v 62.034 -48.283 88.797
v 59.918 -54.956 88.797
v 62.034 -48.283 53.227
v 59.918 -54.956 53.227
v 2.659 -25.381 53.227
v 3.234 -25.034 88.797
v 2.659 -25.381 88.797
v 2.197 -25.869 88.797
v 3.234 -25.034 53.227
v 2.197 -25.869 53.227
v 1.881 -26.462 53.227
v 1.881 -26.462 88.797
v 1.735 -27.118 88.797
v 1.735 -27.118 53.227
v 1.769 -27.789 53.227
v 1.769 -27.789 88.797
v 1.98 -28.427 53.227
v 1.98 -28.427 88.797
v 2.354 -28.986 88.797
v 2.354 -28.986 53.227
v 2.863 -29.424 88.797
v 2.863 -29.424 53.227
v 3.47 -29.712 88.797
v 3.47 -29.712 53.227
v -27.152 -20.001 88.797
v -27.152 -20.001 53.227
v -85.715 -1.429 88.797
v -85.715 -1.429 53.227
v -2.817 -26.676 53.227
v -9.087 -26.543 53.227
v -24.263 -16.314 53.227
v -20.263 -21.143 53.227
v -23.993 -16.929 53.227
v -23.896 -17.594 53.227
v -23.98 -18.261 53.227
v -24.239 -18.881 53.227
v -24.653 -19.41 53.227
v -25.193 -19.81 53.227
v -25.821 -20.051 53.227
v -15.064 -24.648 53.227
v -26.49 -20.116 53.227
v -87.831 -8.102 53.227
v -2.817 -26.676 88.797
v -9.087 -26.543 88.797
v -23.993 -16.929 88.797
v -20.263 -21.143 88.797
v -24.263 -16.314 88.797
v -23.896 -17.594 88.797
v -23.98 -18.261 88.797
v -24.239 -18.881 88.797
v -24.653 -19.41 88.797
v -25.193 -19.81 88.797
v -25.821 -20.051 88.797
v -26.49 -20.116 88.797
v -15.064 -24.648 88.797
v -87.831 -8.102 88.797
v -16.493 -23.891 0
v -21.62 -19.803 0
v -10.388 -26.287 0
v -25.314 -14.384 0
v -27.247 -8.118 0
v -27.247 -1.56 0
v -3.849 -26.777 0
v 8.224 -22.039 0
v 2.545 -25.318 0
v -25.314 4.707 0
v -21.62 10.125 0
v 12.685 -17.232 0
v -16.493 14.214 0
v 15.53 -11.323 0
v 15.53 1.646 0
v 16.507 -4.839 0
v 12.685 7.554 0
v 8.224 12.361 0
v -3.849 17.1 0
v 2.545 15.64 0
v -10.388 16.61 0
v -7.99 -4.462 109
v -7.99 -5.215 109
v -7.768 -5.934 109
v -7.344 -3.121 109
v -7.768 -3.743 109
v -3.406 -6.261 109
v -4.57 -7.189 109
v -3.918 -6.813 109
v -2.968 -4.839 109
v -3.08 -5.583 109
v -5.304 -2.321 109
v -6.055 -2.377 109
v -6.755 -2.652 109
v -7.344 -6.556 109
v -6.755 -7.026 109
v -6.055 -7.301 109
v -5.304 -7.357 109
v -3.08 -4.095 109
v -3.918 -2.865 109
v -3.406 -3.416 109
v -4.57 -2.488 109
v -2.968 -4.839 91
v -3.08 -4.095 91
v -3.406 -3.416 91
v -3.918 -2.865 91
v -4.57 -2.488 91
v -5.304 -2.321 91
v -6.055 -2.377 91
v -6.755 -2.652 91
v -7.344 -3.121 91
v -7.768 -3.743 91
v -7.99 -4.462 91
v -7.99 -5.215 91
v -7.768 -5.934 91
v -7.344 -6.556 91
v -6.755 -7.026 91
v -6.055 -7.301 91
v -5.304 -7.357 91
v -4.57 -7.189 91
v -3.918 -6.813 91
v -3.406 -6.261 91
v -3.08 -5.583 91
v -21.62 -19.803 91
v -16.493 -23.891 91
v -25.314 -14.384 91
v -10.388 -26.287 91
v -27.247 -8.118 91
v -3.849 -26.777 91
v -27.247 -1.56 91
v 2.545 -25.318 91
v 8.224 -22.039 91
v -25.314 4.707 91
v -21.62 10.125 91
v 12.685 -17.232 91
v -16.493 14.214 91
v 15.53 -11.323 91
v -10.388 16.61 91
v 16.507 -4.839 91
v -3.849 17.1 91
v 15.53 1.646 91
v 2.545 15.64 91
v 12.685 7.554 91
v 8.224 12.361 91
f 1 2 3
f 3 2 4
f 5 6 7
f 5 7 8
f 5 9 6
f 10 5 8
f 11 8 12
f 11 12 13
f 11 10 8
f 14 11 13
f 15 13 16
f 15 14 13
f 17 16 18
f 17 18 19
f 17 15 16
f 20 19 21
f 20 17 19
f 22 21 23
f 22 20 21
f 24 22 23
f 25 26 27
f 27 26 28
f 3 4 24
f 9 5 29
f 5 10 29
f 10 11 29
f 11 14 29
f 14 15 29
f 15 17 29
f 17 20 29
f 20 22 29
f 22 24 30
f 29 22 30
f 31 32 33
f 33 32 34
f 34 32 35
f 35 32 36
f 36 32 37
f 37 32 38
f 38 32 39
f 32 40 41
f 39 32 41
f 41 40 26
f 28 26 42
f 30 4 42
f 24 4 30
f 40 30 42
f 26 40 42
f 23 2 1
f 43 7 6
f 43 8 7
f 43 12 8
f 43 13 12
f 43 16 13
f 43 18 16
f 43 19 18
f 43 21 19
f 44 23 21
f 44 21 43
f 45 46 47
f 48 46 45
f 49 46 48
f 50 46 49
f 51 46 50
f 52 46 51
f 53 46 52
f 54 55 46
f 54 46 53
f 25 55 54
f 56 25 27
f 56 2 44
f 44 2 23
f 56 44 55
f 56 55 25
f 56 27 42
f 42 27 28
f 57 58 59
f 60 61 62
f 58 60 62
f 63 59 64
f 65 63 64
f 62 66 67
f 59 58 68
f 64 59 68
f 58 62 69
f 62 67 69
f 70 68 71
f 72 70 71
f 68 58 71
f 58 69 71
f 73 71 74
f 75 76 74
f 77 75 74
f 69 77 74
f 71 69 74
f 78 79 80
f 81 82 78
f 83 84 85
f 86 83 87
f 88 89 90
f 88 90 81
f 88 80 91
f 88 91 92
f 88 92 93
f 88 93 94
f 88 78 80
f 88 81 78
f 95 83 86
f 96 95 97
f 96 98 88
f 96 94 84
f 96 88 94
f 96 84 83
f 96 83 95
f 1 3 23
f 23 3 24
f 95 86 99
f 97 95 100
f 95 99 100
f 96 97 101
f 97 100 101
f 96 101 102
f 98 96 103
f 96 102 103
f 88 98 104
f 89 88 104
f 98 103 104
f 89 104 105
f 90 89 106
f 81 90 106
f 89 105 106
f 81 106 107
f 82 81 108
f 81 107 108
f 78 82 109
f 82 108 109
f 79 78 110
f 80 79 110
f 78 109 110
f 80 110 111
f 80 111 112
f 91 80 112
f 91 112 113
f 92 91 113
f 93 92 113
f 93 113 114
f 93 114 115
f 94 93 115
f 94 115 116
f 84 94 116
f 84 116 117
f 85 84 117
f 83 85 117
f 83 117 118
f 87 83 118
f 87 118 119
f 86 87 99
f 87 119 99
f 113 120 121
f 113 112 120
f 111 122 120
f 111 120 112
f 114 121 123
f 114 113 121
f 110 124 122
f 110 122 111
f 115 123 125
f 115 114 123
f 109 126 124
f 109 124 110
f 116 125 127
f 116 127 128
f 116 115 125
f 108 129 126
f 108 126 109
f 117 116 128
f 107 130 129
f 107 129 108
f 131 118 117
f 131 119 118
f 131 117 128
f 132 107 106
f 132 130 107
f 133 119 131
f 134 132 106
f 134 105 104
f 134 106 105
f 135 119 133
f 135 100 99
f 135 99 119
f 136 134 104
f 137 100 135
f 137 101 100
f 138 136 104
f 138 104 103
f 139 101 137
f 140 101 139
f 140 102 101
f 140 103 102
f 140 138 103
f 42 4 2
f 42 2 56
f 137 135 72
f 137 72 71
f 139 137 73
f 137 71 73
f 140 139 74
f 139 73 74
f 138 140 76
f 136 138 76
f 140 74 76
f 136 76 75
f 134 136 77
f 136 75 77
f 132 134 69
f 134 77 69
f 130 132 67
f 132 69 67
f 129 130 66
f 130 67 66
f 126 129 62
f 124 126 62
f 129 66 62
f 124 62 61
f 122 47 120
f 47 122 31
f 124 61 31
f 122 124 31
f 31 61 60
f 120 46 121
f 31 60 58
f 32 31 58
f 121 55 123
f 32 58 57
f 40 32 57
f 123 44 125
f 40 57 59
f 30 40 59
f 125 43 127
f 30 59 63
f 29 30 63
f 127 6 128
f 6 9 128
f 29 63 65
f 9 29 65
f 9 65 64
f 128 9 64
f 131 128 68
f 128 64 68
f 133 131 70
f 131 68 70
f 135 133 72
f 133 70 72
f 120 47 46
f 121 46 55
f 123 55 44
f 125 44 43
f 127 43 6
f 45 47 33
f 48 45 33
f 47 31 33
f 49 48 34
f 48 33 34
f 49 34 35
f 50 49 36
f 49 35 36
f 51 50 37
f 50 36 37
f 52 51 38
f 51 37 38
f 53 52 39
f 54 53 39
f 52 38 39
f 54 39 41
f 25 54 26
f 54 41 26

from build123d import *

# Parameters (mm, degrees)
SKETCH1_R                = 22
BOSS_EXTRUDE1_DEPTH      = 91
SKETCH2_R                = 2.525052574
BOSS_EXTRUDE2_DEPTH      = 18
SKETCH4_W                = 155
SKETCH4_H                = 35.569912337
BOSS_EXTRUDE3_DEPTH      = 6
BOSS_EXTRUDE3_DEPTH_BACK = 1
FILLET1_R                = 2.5
FILLET2_R                = 2.5


with BuildPart() as part:
    # Sketch1 → Boss-Extrude1 (new body)
    with BuildSketch(Plane.XY):
        with Locations((-5.492733953, -4.838837054)):
            Circle(SKETCH1_R)
    extrude(amount=BOSS_EXTRUDE1_DEPTH)

    # Sketch2 → Boss-Extrude2 (add)
    with BuildSketch(Plane.XY.offset(91)):
        with Locations((-5.492733953, -4.838837054)):
            Circle(SKETCH2_R)
    extrude(amount=BOSS_EXTRUDE2_DEPTH)

    # Sketch4 → Boss-Extrude3 (add, two sides)
    with BuildSketch(Plane(origin=(-12.142972716, -25.809633996, 91), x_dir=(-0.953218043, 0.30228358, 0), z_dir=(-0.30228358, -0.953218043, 0))) as boss_extrude3_sk:
        with Locations((0, 19.988267876)):
            Rectangle(SKETCH4_W, SKETCH4_H)
    extrude(amount=BOSS_EXTRUDE3_DEPTH)
    extrude(boss_extrude3_sk.sketch, amount=-BOSS_EXTRUDE3_DEPTH_BACK)

    # Fillet1
    fillet1_edges = [part.edges().sort_by_distance(p)[0] for p in [
        (-5.59002042, -26.838621947, 71.011732124),
    ]]
    fillet(fillet1_edges, radius=FILLET1_R)

    # Fillet2
    fillet2_edges = [part.edges().sort_by_distance(p)[0] for p in [
        (-18.091357852, -22.87420996, 71.011732124),
    ]]
    fillet(fillet2_edges, radius=FILLET2_R)


solid = part.part
